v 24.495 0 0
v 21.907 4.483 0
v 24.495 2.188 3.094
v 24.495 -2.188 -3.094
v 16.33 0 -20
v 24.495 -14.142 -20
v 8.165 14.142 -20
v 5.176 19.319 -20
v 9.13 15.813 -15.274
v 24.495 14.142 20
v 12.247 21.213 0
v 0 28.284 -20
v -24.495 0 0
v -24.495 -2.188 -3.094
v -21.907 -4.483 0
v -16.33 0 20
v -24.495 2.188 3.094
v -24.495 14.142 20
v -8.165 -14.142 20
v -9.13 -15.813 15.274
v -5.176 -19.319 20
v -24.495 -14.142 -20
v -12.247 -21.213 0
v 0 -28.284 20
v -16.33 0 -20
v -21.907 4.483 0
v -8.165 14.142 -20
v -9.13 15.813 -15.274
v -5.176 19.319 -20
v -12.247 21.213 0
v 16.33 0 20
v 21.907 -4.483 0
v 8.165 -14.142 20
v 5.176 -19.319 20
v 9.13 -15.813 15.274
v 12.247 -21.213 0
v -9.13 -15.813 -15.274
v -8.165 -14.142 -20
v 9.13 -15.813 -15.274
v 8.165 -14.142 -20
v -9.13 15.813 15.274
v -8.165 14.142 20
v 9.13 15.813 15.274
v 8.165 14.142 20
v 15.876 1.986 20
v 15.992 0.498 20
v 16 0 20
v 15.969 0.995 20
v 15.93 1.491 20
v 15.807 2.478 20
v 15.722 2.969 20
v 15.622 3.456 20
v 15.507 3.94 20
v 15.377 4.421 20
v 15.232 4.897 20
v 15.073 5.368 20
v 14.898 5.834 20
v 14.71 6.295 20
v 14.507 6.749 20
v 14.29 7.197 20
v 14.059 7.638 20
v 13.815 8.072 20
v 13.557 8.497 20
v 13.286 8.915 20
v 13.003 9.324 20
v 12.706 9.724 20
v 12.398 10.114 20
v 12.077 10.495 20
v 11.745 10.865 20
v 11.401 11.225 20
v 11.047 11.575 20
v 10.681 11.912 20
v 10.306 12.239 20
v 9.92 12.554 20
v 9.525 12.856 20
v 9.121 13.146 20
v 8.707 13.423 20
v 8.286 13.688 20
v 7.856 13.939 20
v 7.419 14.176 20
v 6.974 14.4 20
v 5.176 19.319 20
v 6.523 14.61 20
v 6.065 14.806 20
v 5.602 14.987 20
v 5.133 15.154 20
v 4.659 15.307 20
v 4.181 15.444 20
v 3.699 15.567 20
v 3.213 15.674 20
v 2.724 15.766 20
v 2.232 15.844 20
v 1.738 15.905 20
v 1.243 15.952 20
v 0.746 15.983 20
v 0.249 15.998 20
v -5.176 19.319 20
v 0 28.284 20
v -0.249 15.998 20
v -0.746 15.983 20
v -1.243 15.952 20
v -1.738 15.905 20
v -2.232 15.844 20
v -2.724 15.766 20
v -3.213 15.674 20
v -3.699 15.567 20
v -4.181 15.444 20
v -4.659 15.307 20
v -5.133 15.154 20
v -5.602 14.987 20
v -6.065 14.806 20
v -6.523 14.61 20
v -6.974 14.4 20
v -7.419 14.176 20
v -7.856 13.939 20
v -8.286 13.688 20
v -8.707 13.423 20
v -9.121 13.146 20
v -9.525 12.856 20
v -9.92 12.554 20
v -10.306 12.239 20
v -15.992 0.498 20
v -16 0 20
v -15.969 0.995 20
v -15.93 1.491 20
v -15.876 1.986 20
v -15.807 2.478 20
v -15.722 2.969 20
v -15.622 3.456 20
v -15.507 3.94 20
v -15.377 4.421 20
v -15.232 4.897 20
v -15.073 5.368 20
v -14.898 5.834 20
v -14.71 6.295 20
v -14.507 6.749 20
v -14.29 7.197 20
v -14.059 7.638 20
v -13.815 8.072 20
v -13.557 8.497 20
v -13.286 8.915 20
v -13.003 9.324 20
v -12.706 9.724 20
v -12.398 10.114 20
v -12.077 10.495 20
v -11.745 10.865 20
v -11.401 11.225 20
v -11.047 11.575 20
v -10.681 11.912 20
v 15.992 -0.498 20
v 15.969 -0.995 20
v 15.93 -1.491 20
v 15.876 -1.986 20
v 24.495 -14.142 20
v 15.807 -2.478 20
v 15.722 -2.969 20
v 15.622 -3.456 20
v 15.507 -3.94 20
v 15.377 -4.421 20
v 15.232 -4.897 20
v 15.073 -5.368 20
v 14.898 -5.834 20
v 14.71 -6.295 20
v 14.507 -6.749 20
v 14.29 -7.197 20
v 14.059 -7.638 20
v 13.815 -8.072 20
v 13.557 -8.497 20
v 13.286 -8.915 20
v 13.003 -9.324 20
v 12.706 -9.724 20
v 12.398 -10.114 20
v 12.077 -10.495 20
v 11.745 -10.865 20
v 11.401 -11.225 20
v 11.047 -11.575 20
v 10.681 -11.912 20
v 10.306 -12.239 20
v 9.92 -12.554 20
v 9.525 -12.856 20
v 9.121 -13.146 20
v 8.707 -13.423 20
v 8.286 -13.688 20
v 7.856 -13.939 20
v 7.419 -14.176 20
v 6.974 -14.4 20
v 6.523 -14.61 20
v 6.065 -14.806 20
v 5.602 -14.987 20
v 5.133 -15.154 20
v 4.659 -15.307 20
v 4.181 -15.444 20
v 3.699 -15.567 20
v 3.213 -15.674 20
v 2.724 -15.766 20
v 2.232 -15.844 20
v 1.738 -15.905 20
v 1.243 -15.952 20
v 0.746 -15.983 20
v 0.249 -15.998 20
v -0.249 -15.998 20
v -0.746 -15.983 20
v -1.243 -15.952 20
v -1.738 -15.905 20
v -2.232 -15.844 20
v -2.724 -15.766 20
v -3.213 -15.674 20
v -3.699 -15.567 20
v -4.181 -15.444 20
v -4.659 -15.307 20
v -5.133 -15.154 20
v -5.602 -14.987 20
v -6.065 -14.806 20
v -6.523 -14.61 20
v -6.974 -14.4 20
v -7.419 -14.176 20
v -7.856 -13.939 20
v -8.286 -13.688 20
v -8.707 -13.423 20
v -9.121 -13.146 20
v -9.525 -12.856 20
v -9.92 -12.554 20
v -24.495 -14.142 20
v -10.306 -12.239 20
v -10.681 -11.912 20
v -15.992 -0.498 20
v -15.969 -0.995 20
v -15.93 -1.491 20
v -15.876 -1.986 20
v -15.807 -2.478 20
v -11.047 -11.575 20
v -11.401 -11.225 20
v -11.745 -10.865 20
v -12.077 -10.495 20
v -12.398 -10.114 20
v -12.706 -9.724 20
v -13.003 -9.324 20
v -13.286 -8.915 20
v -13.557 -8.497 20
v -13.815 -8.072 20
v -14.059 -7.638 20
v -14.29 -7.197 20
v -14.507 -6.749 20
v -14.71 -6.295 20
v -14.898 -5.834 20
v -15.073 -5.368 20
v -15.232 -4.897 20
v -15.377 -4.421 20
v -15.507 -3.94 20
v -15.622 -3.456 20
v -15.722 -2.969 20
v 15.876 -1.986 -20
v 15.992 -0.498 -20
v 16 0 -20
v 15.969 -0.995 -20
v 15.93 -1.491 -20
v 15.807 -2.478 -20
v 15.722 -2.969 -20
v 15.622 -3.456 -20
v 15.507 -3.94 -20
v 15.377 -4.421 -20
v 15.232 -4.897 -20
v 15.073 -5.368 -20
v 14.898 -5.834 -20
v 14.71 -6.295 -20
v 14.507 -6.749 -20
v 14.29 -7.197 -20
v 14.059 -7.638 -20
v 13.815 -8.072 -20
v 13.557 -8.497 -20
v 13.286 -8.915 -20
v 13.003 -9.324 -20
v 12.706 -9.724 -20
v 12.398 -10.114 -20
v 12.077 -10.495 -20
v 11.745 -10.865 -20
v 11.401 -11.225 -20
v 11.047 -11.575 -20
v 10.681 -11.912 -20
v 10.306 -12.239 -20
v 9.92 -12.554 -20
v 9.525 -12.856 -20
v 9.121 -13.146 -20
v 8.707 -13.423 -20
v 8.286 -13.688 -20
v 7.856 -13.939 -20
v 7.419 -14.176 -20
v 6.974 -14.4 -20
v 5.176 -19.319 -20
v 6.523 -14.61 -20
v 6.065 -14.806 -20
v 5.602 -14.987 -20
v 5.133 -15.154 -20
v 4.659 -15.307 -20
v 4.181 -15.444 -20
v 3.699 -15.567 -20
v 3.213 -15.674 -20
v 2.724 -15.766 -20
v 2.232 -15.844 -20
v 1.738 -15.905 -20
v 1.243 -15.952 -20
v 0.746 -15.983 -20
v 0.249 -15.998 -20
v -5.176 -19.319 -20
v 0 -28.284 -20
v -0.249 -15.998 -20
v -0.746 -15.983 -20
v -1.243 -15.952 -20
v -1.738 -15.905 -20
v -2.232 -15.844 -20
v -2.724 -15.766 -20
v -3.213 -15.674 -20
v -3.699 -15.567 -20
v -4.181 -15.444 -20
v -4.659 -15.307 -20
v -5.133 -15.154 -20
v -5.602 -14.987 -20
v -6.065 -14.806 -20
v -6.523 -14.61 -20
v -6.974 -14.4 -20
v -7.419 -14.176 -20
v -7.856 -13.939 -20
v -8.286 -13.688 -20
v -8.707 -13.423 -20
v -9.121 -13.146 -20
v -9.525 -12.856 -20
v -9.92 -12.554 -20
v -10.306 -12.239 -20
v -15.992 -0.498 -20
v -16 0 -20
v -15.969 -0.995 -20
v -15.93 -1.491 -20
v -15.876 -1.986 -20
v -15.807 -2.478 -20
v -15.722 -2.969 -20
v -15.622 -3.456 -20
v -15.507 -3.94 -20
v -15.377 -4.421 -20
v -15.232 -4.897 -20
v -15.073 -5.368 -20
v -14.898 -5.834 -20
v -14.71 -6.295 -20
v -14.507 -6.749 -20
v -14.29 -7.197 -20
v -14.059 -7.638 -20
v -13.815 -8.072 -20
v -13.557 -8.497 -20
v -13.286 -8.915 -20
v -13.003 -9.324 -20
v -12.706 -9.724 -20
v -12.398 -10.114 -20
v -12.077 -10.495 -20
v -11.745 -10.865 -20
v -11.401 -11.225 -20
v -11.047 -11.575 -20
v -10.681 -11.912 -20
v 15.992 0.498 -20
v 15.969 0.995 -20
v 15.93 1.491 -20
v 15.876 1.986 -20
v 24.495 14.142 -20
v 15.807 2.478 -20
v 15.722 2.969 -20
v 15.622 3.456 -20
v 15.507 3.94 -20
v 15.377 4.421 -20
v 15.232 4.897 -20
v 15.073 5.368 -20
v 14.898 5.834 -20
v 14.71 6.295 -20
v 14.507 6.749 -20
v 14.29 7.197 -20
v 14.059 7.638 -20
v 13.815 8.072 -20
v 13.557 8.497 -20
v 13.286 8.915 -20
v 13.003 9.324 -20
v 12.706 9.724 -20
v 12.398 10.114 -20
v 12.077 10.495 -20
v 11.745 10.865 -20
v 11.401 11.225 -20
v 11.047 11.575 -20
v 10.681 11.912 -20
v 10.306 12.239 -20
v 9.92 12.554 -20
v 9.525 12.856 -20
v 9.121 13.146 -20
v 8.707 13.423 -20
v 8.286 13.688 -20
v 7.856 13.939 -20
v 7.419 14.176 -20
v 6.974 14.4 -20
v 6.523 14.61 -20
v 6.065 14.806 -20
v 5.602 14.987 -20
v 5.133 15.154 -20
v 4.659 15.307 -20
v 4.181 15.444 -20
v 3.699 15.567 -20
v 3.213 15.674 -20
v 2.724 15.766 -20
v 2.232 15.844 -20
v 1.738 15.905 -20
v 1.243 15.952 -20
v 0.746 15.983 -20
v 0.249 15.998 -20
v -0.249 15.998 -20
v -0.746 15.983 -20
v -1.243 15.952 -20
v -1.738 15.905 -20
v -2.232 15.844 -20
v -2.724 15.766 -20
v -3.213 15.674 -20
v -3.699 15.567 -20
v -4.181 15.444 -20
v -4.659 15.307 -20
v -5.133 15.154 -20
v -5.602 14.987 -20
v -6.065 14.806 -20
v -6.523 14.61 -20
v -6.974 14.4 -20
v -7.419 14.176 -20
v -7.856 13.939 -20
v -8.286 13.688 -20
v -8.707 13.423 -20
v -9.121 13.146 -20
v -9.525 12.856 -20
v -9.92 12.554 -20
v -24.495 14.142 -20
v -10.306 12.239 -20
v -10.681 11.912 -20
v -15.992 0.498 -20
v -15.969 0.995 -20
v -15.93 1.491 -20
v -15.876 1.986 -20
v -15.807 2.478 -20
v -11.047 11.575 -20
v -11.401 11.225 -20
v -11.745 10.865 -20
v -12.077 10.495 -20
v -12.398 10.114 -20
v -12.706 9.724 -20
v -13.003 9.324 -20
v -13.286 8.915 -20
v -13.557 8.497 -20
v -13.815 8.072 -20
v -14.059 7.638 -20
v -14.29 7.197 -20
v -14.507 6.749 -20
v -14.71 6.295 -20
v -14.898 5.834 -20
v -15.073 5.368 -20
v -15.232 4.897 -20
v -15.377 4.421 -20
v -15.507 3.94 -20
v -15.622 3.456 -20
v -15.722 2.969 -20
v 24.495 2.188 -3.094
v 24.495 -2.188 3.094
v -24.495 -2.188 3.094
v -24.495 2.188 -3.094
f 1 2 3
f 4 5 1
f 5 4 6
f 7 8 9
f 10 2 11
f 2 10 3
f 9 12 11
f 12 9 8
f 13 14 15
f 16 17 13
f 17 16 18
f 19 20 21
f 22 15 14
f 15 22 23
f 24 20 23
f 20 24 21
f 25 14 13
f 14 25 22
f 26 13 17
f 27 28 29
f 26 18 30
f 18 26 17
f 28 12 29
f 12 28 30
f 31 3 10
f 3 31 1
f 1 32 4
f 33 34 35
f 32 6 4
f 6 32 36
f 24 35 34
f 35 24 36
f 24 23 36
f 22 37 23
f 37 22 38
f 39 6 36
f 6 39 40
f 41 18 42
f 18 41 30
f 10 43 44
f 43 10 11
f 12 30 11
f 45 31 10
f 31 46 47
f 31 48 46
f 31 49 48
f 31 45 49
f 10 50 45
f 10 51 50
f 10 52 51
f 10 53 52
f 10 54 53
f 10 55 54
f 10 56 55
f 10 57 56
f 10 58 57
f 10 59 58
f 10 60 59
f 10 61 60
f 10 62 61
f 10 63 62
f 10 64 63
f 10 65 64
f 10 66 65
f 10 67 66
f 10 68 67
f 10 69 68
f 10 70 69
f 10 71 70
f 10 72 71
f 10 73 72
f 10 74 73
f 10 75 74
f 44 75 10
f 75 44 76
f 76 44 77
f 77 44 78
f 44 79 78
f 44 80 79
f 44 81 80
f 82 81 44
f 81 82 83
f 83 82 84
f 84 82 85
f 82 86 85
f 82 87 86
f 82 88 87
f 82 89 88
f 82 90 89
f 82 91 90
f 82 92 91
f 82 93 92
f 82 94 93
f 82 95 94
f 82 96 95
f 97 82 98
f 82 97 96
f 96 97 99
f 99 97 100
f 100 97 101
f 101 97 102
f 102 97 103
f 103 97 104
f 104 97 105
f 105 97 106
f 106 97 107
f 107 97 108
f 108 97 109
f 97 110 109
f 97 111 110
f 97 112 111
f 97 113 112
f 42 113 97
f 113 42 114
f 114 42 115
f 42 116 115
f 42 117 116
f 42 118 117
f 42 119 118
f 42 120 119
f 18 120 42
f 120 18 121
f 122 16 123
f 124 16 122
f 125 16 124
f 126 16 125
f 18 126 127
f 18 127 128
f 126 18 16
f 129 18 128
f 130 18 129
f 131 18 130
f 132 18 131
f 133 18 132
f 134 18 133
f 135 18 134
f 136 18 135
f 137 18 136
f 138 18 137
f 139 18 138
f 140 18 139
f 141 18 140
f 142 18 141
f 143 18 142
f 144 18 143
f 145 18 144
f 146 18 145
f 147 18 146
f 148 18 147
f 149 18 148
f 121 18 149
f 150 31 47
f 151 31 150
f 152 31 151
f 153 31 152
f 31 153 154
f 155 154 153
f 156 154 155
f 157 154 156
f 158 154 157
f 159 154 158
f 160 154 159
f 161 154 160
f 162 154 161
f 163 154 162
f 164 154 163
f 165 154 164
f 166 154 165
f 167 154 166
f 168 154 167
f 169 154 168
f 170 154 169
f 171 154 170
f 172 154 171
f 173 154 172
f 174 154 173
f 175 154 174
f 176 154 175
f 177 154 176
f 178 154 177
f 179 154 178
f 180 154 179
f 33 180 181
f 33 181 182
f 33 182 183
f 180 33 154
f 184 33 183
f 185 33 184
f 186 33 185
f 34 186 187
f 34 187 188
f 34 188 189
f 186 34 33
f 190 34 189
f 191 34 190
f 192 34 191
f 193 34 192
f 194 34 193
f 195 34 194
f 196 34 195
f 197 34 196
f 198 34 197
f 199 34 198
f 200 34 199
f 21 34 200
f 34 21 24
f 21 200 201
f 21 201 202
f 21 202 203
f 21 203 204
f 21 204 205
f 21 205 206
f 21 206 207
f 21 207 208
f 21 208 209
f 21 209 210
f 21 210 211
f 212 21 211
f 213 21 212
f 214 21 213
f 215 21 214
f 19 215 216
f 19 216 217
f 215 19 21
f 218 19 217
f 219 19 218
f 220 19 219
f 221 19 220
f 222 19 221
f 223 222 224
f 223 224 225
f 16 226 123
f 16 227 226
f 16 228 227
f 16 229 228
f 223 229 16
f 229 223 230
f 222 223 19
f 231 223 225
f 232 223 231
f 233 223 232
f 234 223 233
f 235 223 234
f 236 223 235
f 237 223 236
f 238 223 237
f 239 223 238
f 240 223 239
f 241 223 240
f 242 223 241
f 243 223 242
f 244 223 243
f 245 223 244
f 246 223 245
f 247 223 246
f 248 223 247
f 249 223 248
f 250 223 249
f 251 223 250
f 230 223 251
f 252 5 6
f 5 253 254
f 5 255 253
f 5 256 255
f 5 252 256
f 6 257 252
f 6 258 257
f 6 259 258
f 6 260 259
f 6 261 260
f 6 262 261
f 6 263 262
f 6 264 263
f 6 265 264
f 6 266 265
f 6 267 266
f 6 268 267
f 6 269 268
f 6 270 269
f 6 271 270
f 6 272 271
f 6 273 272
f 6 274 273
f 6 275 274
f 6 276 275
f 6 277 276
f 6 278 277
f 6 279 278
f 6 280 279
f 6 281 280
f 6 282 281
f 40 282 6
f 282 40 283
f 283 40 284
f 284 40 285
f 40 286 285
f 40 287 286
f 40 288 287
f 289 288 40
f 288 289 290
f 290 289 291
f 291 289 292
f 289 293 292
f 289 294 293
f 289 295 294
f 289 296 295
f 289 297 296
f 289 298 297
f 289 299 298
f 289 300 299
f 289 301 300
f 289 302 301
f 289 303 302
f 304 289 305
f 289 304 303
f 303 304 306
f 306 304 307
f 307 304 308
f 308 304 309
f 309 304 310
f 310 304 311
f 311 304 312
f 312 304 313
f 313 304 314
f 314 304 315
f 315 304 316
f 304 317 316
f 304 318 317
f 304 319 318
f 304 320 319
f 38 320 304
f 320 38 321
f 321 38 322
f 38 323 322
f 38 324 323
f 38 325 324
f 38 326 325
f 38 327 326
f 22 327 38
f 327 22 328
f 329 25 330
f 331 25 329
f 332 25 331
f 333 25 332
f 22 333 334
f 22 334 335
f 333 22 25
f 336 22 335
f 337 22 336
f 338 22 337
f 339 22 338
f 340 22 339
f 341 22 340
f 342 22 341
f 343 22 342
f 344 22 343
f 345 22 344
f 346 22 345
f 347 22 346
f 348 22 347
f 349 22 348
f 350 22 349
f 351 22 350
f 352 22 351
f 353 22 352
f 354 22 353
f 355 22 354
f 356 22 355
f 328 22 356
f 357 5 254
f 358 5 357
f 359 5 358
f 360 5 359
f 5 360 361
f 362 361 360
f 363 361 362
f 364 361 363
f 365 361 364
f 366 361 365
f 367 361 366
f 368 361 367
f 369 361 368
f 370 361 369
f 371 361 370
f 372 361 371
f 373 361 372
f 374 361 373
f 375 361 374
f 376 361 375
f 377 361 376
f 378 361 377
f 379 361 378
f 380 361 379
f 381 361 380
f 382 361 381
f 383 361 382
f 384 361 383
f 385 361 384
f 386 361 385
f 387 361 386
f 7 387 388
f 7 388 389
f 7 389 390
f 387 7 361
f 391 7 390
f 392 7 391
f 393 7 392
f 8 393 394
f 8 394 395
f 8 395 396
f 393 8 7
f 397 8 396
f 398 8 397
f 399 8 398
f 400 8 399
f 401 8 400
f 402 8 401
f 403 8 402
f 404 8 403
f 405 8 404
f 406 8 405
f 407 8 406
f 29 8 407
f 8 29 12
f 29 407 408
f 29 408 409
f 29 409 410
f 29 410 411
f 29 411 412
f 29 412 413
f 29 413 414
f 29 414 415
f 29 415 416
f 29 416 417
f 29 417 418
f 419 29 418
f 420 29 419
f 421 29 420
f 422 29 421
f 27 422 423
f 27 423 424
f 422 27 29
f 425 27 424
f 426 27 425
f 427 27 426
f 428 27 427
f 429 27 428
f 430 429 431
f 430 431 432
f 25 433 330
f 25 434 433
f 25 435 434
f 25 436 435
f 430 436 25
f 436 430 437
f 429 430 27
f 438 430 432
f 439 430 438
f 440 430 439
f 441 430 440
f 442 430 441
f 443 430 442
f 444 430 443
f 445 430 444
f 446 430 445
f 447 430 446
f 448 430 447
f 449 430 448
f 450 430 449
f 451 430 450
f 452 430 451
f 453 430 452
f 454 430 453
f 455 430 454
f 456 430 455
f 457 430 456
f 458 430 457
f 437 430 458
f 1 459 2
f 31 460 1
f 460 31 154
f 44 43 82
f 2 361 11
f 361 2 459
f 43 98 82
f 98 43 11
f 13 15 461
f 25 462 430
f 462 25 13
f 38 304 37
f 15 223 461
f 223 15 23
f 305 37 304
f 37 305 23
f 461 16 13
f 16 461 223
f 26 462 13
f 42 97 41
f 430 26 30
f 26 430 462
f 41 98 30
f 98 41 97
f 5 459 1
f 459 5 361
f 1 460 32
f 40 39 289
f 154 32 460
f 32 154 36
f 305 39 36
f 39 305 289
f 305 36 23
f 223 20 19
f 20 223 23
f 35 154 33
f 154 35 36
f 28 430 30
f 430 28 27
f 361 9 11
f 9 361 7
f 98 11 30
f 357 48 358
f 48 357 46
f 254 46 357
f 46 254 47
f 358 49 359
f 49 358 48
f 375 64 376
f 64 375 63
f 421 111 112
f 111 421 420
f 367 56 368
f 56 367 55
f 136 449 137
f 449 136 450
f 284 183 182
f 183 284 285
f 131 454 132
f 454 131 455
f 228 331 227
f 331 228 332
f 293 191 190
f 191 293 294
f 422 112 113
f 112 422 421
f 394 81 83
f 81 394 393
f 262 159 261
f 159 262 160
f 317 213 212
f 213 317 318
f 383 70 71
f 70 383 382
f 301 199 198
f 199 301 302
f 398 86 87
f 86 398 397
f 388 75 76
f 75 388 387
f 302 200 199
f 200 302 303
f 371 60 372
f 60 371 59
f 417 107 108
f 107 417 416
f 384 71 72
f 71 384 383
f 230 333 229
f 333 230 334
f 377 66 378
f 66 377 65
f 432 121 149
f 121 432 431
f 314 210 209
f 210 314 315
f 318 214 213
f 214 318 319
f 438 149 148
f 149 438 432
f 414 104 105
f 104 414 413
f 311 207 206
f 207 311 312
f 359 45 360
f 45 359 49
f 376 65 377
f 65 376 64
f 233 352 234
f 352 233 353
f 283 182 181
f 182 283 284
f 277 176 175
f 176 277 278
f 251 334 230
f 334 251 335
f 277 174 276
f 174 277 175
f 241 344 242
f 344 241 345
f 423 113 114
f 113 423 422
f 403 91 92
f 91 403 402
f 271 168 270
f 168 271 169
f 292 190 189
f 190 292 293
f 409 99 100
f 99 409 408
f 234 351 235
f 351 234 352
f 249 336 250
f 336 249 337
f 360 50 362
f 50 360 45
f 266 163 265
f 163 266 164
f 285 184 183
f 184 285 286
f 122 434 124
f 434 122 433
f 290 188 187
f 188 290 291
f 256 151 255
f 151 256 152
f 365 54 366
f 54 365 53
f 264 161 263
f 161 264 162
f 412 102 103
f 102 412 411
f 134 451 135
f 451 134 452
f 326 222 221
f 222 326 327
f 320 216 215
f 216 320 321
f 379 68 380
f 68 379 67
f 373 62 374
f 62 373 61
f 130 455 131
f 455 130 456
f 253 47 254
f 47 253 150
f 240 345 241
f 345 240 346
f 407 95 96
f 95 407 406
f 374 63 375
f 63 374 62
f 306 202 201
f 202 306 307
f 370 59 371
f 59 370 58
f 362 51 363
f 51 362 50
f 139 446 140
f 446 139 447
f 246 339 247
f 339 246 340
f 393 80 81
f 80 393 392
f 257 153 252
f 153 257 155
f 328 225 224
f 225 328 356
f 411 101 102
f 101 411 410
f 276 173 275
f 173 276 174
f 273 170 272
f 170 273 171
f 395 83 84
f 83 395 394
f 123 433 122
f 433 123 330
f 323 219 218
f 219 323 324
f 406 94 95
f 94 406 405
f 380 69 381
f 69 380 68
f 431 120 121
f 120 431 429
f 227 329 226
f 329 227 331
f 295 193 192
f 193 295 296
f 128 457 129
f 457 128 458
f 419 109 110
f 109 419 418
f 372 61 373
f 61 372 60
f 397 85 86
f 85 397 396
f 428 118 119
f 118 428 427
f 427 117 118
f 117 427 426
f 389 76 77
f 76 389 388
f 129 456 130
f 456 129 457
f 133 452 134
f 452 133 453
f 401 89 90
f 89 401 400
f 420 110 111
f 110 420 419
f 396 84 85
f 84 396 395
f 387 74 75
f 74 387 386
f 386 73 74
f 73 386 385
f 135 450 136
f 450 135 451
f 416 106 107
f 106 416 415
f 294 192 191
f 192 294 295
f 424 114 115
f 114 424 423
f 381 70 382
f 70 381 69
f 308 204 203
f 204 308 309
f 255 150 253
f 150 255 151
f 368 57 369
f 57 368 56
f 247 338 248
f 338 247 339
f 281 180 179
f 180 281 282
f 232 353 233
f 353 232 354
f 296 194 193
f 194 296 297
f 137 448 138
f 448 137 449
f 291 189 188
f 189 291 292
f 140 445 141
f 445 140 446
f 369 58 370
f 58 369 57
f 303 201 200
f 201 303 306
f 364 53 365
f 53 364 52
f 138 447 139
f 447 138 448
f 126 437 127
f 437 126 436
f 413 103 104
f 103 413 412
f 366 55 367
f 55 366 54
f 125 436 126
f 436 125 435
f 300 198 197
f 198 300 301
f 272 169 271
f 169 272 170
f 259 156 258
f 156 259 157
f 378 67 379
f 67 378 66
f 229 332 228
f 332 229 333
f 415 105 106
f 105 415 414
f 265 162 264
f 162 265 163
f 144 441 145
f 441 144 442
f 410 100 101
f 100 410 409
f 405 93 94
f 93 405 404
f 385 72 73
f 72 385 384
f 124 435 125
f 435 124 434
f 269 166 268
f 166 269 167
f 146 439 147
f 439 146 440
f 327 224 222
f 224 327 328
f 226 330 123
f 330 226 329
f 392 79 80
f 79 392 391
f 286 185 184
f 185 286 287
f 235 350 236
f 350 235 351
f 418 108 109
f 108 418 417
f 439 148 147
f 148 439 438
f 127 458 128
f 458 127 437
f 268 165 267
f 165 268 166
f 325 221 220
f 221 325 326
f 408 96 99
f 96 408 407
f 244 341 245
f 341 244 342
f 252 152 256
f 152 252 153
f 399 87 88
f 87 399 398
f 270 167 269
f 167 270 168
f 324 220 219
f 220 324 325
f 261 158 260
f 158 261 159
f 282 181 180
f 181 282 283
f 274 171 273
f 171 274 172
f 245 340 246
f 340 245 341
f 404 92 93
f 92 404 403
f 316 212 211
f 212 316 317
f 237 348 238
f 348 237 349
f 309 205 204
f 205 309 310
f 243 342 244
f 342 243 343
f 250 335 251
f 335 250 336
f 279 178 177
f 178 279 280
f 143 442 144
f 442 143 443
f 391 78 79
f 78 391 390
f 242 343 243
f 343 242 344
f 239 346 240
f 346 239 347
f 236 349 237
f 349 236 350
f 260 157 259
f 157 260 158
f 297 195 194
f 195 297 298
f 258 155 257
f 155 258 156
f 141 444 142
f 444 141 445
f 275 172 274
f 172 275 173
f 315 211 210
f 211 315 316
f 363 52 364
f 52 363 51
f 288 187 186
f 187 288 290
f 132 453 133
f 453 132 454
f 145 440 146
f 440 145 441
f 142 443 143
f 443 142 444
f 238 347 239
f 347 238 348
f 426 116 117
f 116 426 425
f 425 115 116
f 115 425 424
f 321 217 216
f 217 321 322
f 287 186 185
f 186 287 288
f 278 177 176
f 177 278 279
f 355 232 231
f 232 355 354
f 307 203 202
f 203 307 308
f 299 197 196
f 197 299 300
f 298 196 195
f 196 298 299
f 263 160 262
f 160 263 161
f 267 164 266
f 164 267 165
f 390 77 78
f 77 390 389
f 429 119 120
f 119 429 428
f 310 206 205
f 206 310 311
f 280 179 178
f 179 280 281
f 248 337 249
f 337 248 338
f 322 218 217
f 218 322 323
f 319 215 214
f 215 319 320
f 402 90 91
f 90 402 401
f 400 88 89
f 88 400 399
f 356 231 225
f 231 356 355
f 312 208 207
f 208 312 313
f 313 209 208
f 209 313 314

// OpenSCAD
module box(size) {
    cube([2*size, 2*size, size], center = true); 
}

module octahedron(size) {
      dihedral = 109.47122;
      n = 3;
      intersection(){
            box(size);
            intersection_for(i=[1:n])  { 
                rotate([dihedral, 0, 360 /n * i])  box(size); 
           }
      }
}

module ring(size) {
       difference() {
             union() {
                octahedron(size);
                mirror([0,0,90]) octahedron(size); 
             }
      translate([0,0,-size]) cylinder(r=size/2.5, h=2*size);      
     }
}

$fa = 0.01;
$fs = .5;
size = 40;
echo (size/2.5);
ring(size);
